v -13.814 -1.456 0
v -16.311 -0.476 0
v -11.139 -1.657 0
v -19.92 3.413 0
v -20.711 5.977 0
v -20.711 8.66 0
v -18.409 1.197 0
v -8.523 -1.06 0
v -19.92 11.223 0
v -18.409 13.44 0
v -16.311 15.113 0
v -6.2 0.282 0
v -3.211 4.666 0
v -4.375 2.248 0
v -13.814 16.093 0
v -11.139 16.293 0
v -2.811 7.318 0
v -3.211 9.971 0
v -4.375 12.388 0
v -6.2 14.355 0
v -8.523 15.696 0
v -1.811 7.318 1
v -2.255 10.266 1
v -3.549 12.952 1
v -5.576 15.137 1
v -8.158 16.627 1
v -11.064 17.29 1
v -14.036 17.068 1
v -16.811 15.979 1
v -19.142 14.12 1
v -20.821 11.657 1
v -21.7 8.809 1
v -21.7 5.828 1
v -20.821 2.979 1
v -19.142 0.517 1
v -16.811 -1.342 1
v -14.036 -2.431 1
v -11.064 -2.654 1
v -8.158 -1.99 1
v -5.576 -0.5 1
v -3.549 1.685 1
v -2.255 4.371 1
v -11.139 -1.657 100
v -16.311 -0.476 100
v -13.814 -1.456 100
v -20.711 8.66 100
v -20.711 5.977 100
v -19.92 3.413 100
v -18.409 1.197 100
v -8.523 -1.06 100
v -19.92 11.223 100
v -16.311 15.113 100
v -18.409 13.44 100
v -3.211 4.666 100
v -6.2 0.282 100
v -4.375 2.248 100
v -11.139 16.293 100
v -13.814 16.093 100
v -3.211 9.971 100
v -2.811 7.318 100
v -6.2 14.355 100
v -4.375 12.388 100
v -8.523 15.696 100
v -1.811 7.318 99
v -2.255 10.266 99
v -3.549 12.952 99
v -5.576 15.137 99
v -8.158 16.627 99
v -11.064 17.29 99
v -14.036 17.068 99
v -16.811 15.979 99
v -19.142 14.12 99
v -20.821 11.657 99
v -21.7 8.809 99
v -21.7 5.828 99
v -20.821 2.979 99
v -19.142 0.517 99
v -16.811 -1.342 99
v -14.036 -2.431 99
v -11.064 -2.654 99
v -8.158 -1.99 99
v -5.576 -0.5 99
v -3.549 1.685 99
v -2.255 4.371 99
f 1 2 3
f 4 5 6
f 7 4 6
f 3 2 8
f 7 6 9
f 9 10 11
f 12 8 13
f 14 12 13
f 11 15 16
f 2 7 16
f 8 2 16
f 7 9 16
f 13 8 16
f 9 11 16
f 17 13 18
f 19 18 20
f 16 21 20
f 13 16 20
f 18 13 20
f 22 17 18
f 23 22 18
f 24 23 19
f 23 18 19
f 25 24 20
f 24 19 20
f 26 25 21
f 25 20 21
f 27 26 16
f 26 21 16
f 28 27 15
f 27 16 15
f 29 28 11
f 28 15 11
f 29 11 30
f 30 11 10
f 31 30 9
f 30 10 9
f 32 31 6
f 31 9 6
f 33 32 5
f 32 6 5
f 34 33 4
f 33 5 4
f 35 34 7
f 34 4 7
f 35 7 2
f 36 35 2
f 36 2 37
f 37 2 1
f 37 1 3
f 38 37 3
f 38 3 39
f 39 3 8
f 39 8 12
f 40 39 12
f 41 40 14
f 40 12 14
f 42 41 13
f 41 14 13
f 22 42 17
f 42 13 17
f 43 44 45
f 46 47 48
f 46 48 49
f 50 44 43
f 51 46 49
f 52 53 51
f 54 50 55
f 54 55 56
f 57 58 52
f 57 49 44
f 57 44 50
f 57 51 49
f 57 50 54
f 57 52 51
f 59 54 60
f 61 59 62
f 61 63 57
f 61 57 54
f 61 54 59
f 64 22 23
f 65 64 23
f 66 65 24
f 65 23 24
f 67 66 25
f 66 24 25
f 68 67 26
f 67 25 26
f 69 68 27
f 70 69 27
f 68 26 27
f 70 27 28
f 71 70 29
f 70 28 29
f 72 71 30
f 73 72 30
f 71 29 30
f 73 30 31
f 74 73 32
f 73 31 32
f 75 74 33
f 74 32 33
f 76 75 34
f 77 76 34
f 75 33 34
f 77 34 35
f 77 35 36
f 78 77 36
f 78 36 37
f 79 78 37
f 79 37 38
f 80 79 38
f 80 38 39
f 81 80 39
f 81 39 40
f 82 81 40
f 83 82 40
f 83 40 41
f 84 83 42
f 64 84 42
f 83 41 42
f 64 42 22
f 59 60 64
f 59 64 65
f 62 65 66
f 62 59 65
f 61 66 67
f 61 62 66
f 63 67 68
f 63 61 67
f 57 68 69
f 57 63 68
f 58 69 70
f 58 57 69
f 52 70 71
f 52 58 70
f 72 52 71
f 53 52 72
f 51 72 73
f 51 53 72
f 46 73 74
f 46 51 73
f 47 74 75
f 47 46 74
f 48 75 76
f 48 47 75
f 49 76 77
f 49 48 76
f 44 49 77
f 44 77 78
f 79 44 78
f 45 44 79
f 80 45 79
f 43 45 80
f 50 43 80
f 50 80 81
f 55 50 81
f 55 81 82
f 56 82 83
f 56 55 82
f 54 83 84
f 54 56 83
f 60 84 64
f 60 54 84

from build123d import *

# Parameters (mm, degrees)
F0_R     = 10
F1_DEPTH = 100
F2_SIZE  = 1
F3_SIZE  = 1


with BuildPart() as f1:
    # F0 (on Top) → F1 (new body)
    with BuildSketch(Plane.XY):
        with Locations((-11.811228, 7.31832)):
            Circle(F0_R)
    extrude(amount=F1_DEPTH)

    # F2
    f2_edges = [f1.edges().sort_by_distance(p)[0] for p in [
        (-21.811228, 7.31832, 100),
    ]]
    chamfer(f2_edges, length=F2_SIZE)

    # F3
    f3_edges = [f1.edges().sort_by_distance(p)[0] for p in [
        (-21.811228, 7.31832, 0),
    ]]
    chamfer(f3_edges, length=F3_SIZE)


solid = f1.part
